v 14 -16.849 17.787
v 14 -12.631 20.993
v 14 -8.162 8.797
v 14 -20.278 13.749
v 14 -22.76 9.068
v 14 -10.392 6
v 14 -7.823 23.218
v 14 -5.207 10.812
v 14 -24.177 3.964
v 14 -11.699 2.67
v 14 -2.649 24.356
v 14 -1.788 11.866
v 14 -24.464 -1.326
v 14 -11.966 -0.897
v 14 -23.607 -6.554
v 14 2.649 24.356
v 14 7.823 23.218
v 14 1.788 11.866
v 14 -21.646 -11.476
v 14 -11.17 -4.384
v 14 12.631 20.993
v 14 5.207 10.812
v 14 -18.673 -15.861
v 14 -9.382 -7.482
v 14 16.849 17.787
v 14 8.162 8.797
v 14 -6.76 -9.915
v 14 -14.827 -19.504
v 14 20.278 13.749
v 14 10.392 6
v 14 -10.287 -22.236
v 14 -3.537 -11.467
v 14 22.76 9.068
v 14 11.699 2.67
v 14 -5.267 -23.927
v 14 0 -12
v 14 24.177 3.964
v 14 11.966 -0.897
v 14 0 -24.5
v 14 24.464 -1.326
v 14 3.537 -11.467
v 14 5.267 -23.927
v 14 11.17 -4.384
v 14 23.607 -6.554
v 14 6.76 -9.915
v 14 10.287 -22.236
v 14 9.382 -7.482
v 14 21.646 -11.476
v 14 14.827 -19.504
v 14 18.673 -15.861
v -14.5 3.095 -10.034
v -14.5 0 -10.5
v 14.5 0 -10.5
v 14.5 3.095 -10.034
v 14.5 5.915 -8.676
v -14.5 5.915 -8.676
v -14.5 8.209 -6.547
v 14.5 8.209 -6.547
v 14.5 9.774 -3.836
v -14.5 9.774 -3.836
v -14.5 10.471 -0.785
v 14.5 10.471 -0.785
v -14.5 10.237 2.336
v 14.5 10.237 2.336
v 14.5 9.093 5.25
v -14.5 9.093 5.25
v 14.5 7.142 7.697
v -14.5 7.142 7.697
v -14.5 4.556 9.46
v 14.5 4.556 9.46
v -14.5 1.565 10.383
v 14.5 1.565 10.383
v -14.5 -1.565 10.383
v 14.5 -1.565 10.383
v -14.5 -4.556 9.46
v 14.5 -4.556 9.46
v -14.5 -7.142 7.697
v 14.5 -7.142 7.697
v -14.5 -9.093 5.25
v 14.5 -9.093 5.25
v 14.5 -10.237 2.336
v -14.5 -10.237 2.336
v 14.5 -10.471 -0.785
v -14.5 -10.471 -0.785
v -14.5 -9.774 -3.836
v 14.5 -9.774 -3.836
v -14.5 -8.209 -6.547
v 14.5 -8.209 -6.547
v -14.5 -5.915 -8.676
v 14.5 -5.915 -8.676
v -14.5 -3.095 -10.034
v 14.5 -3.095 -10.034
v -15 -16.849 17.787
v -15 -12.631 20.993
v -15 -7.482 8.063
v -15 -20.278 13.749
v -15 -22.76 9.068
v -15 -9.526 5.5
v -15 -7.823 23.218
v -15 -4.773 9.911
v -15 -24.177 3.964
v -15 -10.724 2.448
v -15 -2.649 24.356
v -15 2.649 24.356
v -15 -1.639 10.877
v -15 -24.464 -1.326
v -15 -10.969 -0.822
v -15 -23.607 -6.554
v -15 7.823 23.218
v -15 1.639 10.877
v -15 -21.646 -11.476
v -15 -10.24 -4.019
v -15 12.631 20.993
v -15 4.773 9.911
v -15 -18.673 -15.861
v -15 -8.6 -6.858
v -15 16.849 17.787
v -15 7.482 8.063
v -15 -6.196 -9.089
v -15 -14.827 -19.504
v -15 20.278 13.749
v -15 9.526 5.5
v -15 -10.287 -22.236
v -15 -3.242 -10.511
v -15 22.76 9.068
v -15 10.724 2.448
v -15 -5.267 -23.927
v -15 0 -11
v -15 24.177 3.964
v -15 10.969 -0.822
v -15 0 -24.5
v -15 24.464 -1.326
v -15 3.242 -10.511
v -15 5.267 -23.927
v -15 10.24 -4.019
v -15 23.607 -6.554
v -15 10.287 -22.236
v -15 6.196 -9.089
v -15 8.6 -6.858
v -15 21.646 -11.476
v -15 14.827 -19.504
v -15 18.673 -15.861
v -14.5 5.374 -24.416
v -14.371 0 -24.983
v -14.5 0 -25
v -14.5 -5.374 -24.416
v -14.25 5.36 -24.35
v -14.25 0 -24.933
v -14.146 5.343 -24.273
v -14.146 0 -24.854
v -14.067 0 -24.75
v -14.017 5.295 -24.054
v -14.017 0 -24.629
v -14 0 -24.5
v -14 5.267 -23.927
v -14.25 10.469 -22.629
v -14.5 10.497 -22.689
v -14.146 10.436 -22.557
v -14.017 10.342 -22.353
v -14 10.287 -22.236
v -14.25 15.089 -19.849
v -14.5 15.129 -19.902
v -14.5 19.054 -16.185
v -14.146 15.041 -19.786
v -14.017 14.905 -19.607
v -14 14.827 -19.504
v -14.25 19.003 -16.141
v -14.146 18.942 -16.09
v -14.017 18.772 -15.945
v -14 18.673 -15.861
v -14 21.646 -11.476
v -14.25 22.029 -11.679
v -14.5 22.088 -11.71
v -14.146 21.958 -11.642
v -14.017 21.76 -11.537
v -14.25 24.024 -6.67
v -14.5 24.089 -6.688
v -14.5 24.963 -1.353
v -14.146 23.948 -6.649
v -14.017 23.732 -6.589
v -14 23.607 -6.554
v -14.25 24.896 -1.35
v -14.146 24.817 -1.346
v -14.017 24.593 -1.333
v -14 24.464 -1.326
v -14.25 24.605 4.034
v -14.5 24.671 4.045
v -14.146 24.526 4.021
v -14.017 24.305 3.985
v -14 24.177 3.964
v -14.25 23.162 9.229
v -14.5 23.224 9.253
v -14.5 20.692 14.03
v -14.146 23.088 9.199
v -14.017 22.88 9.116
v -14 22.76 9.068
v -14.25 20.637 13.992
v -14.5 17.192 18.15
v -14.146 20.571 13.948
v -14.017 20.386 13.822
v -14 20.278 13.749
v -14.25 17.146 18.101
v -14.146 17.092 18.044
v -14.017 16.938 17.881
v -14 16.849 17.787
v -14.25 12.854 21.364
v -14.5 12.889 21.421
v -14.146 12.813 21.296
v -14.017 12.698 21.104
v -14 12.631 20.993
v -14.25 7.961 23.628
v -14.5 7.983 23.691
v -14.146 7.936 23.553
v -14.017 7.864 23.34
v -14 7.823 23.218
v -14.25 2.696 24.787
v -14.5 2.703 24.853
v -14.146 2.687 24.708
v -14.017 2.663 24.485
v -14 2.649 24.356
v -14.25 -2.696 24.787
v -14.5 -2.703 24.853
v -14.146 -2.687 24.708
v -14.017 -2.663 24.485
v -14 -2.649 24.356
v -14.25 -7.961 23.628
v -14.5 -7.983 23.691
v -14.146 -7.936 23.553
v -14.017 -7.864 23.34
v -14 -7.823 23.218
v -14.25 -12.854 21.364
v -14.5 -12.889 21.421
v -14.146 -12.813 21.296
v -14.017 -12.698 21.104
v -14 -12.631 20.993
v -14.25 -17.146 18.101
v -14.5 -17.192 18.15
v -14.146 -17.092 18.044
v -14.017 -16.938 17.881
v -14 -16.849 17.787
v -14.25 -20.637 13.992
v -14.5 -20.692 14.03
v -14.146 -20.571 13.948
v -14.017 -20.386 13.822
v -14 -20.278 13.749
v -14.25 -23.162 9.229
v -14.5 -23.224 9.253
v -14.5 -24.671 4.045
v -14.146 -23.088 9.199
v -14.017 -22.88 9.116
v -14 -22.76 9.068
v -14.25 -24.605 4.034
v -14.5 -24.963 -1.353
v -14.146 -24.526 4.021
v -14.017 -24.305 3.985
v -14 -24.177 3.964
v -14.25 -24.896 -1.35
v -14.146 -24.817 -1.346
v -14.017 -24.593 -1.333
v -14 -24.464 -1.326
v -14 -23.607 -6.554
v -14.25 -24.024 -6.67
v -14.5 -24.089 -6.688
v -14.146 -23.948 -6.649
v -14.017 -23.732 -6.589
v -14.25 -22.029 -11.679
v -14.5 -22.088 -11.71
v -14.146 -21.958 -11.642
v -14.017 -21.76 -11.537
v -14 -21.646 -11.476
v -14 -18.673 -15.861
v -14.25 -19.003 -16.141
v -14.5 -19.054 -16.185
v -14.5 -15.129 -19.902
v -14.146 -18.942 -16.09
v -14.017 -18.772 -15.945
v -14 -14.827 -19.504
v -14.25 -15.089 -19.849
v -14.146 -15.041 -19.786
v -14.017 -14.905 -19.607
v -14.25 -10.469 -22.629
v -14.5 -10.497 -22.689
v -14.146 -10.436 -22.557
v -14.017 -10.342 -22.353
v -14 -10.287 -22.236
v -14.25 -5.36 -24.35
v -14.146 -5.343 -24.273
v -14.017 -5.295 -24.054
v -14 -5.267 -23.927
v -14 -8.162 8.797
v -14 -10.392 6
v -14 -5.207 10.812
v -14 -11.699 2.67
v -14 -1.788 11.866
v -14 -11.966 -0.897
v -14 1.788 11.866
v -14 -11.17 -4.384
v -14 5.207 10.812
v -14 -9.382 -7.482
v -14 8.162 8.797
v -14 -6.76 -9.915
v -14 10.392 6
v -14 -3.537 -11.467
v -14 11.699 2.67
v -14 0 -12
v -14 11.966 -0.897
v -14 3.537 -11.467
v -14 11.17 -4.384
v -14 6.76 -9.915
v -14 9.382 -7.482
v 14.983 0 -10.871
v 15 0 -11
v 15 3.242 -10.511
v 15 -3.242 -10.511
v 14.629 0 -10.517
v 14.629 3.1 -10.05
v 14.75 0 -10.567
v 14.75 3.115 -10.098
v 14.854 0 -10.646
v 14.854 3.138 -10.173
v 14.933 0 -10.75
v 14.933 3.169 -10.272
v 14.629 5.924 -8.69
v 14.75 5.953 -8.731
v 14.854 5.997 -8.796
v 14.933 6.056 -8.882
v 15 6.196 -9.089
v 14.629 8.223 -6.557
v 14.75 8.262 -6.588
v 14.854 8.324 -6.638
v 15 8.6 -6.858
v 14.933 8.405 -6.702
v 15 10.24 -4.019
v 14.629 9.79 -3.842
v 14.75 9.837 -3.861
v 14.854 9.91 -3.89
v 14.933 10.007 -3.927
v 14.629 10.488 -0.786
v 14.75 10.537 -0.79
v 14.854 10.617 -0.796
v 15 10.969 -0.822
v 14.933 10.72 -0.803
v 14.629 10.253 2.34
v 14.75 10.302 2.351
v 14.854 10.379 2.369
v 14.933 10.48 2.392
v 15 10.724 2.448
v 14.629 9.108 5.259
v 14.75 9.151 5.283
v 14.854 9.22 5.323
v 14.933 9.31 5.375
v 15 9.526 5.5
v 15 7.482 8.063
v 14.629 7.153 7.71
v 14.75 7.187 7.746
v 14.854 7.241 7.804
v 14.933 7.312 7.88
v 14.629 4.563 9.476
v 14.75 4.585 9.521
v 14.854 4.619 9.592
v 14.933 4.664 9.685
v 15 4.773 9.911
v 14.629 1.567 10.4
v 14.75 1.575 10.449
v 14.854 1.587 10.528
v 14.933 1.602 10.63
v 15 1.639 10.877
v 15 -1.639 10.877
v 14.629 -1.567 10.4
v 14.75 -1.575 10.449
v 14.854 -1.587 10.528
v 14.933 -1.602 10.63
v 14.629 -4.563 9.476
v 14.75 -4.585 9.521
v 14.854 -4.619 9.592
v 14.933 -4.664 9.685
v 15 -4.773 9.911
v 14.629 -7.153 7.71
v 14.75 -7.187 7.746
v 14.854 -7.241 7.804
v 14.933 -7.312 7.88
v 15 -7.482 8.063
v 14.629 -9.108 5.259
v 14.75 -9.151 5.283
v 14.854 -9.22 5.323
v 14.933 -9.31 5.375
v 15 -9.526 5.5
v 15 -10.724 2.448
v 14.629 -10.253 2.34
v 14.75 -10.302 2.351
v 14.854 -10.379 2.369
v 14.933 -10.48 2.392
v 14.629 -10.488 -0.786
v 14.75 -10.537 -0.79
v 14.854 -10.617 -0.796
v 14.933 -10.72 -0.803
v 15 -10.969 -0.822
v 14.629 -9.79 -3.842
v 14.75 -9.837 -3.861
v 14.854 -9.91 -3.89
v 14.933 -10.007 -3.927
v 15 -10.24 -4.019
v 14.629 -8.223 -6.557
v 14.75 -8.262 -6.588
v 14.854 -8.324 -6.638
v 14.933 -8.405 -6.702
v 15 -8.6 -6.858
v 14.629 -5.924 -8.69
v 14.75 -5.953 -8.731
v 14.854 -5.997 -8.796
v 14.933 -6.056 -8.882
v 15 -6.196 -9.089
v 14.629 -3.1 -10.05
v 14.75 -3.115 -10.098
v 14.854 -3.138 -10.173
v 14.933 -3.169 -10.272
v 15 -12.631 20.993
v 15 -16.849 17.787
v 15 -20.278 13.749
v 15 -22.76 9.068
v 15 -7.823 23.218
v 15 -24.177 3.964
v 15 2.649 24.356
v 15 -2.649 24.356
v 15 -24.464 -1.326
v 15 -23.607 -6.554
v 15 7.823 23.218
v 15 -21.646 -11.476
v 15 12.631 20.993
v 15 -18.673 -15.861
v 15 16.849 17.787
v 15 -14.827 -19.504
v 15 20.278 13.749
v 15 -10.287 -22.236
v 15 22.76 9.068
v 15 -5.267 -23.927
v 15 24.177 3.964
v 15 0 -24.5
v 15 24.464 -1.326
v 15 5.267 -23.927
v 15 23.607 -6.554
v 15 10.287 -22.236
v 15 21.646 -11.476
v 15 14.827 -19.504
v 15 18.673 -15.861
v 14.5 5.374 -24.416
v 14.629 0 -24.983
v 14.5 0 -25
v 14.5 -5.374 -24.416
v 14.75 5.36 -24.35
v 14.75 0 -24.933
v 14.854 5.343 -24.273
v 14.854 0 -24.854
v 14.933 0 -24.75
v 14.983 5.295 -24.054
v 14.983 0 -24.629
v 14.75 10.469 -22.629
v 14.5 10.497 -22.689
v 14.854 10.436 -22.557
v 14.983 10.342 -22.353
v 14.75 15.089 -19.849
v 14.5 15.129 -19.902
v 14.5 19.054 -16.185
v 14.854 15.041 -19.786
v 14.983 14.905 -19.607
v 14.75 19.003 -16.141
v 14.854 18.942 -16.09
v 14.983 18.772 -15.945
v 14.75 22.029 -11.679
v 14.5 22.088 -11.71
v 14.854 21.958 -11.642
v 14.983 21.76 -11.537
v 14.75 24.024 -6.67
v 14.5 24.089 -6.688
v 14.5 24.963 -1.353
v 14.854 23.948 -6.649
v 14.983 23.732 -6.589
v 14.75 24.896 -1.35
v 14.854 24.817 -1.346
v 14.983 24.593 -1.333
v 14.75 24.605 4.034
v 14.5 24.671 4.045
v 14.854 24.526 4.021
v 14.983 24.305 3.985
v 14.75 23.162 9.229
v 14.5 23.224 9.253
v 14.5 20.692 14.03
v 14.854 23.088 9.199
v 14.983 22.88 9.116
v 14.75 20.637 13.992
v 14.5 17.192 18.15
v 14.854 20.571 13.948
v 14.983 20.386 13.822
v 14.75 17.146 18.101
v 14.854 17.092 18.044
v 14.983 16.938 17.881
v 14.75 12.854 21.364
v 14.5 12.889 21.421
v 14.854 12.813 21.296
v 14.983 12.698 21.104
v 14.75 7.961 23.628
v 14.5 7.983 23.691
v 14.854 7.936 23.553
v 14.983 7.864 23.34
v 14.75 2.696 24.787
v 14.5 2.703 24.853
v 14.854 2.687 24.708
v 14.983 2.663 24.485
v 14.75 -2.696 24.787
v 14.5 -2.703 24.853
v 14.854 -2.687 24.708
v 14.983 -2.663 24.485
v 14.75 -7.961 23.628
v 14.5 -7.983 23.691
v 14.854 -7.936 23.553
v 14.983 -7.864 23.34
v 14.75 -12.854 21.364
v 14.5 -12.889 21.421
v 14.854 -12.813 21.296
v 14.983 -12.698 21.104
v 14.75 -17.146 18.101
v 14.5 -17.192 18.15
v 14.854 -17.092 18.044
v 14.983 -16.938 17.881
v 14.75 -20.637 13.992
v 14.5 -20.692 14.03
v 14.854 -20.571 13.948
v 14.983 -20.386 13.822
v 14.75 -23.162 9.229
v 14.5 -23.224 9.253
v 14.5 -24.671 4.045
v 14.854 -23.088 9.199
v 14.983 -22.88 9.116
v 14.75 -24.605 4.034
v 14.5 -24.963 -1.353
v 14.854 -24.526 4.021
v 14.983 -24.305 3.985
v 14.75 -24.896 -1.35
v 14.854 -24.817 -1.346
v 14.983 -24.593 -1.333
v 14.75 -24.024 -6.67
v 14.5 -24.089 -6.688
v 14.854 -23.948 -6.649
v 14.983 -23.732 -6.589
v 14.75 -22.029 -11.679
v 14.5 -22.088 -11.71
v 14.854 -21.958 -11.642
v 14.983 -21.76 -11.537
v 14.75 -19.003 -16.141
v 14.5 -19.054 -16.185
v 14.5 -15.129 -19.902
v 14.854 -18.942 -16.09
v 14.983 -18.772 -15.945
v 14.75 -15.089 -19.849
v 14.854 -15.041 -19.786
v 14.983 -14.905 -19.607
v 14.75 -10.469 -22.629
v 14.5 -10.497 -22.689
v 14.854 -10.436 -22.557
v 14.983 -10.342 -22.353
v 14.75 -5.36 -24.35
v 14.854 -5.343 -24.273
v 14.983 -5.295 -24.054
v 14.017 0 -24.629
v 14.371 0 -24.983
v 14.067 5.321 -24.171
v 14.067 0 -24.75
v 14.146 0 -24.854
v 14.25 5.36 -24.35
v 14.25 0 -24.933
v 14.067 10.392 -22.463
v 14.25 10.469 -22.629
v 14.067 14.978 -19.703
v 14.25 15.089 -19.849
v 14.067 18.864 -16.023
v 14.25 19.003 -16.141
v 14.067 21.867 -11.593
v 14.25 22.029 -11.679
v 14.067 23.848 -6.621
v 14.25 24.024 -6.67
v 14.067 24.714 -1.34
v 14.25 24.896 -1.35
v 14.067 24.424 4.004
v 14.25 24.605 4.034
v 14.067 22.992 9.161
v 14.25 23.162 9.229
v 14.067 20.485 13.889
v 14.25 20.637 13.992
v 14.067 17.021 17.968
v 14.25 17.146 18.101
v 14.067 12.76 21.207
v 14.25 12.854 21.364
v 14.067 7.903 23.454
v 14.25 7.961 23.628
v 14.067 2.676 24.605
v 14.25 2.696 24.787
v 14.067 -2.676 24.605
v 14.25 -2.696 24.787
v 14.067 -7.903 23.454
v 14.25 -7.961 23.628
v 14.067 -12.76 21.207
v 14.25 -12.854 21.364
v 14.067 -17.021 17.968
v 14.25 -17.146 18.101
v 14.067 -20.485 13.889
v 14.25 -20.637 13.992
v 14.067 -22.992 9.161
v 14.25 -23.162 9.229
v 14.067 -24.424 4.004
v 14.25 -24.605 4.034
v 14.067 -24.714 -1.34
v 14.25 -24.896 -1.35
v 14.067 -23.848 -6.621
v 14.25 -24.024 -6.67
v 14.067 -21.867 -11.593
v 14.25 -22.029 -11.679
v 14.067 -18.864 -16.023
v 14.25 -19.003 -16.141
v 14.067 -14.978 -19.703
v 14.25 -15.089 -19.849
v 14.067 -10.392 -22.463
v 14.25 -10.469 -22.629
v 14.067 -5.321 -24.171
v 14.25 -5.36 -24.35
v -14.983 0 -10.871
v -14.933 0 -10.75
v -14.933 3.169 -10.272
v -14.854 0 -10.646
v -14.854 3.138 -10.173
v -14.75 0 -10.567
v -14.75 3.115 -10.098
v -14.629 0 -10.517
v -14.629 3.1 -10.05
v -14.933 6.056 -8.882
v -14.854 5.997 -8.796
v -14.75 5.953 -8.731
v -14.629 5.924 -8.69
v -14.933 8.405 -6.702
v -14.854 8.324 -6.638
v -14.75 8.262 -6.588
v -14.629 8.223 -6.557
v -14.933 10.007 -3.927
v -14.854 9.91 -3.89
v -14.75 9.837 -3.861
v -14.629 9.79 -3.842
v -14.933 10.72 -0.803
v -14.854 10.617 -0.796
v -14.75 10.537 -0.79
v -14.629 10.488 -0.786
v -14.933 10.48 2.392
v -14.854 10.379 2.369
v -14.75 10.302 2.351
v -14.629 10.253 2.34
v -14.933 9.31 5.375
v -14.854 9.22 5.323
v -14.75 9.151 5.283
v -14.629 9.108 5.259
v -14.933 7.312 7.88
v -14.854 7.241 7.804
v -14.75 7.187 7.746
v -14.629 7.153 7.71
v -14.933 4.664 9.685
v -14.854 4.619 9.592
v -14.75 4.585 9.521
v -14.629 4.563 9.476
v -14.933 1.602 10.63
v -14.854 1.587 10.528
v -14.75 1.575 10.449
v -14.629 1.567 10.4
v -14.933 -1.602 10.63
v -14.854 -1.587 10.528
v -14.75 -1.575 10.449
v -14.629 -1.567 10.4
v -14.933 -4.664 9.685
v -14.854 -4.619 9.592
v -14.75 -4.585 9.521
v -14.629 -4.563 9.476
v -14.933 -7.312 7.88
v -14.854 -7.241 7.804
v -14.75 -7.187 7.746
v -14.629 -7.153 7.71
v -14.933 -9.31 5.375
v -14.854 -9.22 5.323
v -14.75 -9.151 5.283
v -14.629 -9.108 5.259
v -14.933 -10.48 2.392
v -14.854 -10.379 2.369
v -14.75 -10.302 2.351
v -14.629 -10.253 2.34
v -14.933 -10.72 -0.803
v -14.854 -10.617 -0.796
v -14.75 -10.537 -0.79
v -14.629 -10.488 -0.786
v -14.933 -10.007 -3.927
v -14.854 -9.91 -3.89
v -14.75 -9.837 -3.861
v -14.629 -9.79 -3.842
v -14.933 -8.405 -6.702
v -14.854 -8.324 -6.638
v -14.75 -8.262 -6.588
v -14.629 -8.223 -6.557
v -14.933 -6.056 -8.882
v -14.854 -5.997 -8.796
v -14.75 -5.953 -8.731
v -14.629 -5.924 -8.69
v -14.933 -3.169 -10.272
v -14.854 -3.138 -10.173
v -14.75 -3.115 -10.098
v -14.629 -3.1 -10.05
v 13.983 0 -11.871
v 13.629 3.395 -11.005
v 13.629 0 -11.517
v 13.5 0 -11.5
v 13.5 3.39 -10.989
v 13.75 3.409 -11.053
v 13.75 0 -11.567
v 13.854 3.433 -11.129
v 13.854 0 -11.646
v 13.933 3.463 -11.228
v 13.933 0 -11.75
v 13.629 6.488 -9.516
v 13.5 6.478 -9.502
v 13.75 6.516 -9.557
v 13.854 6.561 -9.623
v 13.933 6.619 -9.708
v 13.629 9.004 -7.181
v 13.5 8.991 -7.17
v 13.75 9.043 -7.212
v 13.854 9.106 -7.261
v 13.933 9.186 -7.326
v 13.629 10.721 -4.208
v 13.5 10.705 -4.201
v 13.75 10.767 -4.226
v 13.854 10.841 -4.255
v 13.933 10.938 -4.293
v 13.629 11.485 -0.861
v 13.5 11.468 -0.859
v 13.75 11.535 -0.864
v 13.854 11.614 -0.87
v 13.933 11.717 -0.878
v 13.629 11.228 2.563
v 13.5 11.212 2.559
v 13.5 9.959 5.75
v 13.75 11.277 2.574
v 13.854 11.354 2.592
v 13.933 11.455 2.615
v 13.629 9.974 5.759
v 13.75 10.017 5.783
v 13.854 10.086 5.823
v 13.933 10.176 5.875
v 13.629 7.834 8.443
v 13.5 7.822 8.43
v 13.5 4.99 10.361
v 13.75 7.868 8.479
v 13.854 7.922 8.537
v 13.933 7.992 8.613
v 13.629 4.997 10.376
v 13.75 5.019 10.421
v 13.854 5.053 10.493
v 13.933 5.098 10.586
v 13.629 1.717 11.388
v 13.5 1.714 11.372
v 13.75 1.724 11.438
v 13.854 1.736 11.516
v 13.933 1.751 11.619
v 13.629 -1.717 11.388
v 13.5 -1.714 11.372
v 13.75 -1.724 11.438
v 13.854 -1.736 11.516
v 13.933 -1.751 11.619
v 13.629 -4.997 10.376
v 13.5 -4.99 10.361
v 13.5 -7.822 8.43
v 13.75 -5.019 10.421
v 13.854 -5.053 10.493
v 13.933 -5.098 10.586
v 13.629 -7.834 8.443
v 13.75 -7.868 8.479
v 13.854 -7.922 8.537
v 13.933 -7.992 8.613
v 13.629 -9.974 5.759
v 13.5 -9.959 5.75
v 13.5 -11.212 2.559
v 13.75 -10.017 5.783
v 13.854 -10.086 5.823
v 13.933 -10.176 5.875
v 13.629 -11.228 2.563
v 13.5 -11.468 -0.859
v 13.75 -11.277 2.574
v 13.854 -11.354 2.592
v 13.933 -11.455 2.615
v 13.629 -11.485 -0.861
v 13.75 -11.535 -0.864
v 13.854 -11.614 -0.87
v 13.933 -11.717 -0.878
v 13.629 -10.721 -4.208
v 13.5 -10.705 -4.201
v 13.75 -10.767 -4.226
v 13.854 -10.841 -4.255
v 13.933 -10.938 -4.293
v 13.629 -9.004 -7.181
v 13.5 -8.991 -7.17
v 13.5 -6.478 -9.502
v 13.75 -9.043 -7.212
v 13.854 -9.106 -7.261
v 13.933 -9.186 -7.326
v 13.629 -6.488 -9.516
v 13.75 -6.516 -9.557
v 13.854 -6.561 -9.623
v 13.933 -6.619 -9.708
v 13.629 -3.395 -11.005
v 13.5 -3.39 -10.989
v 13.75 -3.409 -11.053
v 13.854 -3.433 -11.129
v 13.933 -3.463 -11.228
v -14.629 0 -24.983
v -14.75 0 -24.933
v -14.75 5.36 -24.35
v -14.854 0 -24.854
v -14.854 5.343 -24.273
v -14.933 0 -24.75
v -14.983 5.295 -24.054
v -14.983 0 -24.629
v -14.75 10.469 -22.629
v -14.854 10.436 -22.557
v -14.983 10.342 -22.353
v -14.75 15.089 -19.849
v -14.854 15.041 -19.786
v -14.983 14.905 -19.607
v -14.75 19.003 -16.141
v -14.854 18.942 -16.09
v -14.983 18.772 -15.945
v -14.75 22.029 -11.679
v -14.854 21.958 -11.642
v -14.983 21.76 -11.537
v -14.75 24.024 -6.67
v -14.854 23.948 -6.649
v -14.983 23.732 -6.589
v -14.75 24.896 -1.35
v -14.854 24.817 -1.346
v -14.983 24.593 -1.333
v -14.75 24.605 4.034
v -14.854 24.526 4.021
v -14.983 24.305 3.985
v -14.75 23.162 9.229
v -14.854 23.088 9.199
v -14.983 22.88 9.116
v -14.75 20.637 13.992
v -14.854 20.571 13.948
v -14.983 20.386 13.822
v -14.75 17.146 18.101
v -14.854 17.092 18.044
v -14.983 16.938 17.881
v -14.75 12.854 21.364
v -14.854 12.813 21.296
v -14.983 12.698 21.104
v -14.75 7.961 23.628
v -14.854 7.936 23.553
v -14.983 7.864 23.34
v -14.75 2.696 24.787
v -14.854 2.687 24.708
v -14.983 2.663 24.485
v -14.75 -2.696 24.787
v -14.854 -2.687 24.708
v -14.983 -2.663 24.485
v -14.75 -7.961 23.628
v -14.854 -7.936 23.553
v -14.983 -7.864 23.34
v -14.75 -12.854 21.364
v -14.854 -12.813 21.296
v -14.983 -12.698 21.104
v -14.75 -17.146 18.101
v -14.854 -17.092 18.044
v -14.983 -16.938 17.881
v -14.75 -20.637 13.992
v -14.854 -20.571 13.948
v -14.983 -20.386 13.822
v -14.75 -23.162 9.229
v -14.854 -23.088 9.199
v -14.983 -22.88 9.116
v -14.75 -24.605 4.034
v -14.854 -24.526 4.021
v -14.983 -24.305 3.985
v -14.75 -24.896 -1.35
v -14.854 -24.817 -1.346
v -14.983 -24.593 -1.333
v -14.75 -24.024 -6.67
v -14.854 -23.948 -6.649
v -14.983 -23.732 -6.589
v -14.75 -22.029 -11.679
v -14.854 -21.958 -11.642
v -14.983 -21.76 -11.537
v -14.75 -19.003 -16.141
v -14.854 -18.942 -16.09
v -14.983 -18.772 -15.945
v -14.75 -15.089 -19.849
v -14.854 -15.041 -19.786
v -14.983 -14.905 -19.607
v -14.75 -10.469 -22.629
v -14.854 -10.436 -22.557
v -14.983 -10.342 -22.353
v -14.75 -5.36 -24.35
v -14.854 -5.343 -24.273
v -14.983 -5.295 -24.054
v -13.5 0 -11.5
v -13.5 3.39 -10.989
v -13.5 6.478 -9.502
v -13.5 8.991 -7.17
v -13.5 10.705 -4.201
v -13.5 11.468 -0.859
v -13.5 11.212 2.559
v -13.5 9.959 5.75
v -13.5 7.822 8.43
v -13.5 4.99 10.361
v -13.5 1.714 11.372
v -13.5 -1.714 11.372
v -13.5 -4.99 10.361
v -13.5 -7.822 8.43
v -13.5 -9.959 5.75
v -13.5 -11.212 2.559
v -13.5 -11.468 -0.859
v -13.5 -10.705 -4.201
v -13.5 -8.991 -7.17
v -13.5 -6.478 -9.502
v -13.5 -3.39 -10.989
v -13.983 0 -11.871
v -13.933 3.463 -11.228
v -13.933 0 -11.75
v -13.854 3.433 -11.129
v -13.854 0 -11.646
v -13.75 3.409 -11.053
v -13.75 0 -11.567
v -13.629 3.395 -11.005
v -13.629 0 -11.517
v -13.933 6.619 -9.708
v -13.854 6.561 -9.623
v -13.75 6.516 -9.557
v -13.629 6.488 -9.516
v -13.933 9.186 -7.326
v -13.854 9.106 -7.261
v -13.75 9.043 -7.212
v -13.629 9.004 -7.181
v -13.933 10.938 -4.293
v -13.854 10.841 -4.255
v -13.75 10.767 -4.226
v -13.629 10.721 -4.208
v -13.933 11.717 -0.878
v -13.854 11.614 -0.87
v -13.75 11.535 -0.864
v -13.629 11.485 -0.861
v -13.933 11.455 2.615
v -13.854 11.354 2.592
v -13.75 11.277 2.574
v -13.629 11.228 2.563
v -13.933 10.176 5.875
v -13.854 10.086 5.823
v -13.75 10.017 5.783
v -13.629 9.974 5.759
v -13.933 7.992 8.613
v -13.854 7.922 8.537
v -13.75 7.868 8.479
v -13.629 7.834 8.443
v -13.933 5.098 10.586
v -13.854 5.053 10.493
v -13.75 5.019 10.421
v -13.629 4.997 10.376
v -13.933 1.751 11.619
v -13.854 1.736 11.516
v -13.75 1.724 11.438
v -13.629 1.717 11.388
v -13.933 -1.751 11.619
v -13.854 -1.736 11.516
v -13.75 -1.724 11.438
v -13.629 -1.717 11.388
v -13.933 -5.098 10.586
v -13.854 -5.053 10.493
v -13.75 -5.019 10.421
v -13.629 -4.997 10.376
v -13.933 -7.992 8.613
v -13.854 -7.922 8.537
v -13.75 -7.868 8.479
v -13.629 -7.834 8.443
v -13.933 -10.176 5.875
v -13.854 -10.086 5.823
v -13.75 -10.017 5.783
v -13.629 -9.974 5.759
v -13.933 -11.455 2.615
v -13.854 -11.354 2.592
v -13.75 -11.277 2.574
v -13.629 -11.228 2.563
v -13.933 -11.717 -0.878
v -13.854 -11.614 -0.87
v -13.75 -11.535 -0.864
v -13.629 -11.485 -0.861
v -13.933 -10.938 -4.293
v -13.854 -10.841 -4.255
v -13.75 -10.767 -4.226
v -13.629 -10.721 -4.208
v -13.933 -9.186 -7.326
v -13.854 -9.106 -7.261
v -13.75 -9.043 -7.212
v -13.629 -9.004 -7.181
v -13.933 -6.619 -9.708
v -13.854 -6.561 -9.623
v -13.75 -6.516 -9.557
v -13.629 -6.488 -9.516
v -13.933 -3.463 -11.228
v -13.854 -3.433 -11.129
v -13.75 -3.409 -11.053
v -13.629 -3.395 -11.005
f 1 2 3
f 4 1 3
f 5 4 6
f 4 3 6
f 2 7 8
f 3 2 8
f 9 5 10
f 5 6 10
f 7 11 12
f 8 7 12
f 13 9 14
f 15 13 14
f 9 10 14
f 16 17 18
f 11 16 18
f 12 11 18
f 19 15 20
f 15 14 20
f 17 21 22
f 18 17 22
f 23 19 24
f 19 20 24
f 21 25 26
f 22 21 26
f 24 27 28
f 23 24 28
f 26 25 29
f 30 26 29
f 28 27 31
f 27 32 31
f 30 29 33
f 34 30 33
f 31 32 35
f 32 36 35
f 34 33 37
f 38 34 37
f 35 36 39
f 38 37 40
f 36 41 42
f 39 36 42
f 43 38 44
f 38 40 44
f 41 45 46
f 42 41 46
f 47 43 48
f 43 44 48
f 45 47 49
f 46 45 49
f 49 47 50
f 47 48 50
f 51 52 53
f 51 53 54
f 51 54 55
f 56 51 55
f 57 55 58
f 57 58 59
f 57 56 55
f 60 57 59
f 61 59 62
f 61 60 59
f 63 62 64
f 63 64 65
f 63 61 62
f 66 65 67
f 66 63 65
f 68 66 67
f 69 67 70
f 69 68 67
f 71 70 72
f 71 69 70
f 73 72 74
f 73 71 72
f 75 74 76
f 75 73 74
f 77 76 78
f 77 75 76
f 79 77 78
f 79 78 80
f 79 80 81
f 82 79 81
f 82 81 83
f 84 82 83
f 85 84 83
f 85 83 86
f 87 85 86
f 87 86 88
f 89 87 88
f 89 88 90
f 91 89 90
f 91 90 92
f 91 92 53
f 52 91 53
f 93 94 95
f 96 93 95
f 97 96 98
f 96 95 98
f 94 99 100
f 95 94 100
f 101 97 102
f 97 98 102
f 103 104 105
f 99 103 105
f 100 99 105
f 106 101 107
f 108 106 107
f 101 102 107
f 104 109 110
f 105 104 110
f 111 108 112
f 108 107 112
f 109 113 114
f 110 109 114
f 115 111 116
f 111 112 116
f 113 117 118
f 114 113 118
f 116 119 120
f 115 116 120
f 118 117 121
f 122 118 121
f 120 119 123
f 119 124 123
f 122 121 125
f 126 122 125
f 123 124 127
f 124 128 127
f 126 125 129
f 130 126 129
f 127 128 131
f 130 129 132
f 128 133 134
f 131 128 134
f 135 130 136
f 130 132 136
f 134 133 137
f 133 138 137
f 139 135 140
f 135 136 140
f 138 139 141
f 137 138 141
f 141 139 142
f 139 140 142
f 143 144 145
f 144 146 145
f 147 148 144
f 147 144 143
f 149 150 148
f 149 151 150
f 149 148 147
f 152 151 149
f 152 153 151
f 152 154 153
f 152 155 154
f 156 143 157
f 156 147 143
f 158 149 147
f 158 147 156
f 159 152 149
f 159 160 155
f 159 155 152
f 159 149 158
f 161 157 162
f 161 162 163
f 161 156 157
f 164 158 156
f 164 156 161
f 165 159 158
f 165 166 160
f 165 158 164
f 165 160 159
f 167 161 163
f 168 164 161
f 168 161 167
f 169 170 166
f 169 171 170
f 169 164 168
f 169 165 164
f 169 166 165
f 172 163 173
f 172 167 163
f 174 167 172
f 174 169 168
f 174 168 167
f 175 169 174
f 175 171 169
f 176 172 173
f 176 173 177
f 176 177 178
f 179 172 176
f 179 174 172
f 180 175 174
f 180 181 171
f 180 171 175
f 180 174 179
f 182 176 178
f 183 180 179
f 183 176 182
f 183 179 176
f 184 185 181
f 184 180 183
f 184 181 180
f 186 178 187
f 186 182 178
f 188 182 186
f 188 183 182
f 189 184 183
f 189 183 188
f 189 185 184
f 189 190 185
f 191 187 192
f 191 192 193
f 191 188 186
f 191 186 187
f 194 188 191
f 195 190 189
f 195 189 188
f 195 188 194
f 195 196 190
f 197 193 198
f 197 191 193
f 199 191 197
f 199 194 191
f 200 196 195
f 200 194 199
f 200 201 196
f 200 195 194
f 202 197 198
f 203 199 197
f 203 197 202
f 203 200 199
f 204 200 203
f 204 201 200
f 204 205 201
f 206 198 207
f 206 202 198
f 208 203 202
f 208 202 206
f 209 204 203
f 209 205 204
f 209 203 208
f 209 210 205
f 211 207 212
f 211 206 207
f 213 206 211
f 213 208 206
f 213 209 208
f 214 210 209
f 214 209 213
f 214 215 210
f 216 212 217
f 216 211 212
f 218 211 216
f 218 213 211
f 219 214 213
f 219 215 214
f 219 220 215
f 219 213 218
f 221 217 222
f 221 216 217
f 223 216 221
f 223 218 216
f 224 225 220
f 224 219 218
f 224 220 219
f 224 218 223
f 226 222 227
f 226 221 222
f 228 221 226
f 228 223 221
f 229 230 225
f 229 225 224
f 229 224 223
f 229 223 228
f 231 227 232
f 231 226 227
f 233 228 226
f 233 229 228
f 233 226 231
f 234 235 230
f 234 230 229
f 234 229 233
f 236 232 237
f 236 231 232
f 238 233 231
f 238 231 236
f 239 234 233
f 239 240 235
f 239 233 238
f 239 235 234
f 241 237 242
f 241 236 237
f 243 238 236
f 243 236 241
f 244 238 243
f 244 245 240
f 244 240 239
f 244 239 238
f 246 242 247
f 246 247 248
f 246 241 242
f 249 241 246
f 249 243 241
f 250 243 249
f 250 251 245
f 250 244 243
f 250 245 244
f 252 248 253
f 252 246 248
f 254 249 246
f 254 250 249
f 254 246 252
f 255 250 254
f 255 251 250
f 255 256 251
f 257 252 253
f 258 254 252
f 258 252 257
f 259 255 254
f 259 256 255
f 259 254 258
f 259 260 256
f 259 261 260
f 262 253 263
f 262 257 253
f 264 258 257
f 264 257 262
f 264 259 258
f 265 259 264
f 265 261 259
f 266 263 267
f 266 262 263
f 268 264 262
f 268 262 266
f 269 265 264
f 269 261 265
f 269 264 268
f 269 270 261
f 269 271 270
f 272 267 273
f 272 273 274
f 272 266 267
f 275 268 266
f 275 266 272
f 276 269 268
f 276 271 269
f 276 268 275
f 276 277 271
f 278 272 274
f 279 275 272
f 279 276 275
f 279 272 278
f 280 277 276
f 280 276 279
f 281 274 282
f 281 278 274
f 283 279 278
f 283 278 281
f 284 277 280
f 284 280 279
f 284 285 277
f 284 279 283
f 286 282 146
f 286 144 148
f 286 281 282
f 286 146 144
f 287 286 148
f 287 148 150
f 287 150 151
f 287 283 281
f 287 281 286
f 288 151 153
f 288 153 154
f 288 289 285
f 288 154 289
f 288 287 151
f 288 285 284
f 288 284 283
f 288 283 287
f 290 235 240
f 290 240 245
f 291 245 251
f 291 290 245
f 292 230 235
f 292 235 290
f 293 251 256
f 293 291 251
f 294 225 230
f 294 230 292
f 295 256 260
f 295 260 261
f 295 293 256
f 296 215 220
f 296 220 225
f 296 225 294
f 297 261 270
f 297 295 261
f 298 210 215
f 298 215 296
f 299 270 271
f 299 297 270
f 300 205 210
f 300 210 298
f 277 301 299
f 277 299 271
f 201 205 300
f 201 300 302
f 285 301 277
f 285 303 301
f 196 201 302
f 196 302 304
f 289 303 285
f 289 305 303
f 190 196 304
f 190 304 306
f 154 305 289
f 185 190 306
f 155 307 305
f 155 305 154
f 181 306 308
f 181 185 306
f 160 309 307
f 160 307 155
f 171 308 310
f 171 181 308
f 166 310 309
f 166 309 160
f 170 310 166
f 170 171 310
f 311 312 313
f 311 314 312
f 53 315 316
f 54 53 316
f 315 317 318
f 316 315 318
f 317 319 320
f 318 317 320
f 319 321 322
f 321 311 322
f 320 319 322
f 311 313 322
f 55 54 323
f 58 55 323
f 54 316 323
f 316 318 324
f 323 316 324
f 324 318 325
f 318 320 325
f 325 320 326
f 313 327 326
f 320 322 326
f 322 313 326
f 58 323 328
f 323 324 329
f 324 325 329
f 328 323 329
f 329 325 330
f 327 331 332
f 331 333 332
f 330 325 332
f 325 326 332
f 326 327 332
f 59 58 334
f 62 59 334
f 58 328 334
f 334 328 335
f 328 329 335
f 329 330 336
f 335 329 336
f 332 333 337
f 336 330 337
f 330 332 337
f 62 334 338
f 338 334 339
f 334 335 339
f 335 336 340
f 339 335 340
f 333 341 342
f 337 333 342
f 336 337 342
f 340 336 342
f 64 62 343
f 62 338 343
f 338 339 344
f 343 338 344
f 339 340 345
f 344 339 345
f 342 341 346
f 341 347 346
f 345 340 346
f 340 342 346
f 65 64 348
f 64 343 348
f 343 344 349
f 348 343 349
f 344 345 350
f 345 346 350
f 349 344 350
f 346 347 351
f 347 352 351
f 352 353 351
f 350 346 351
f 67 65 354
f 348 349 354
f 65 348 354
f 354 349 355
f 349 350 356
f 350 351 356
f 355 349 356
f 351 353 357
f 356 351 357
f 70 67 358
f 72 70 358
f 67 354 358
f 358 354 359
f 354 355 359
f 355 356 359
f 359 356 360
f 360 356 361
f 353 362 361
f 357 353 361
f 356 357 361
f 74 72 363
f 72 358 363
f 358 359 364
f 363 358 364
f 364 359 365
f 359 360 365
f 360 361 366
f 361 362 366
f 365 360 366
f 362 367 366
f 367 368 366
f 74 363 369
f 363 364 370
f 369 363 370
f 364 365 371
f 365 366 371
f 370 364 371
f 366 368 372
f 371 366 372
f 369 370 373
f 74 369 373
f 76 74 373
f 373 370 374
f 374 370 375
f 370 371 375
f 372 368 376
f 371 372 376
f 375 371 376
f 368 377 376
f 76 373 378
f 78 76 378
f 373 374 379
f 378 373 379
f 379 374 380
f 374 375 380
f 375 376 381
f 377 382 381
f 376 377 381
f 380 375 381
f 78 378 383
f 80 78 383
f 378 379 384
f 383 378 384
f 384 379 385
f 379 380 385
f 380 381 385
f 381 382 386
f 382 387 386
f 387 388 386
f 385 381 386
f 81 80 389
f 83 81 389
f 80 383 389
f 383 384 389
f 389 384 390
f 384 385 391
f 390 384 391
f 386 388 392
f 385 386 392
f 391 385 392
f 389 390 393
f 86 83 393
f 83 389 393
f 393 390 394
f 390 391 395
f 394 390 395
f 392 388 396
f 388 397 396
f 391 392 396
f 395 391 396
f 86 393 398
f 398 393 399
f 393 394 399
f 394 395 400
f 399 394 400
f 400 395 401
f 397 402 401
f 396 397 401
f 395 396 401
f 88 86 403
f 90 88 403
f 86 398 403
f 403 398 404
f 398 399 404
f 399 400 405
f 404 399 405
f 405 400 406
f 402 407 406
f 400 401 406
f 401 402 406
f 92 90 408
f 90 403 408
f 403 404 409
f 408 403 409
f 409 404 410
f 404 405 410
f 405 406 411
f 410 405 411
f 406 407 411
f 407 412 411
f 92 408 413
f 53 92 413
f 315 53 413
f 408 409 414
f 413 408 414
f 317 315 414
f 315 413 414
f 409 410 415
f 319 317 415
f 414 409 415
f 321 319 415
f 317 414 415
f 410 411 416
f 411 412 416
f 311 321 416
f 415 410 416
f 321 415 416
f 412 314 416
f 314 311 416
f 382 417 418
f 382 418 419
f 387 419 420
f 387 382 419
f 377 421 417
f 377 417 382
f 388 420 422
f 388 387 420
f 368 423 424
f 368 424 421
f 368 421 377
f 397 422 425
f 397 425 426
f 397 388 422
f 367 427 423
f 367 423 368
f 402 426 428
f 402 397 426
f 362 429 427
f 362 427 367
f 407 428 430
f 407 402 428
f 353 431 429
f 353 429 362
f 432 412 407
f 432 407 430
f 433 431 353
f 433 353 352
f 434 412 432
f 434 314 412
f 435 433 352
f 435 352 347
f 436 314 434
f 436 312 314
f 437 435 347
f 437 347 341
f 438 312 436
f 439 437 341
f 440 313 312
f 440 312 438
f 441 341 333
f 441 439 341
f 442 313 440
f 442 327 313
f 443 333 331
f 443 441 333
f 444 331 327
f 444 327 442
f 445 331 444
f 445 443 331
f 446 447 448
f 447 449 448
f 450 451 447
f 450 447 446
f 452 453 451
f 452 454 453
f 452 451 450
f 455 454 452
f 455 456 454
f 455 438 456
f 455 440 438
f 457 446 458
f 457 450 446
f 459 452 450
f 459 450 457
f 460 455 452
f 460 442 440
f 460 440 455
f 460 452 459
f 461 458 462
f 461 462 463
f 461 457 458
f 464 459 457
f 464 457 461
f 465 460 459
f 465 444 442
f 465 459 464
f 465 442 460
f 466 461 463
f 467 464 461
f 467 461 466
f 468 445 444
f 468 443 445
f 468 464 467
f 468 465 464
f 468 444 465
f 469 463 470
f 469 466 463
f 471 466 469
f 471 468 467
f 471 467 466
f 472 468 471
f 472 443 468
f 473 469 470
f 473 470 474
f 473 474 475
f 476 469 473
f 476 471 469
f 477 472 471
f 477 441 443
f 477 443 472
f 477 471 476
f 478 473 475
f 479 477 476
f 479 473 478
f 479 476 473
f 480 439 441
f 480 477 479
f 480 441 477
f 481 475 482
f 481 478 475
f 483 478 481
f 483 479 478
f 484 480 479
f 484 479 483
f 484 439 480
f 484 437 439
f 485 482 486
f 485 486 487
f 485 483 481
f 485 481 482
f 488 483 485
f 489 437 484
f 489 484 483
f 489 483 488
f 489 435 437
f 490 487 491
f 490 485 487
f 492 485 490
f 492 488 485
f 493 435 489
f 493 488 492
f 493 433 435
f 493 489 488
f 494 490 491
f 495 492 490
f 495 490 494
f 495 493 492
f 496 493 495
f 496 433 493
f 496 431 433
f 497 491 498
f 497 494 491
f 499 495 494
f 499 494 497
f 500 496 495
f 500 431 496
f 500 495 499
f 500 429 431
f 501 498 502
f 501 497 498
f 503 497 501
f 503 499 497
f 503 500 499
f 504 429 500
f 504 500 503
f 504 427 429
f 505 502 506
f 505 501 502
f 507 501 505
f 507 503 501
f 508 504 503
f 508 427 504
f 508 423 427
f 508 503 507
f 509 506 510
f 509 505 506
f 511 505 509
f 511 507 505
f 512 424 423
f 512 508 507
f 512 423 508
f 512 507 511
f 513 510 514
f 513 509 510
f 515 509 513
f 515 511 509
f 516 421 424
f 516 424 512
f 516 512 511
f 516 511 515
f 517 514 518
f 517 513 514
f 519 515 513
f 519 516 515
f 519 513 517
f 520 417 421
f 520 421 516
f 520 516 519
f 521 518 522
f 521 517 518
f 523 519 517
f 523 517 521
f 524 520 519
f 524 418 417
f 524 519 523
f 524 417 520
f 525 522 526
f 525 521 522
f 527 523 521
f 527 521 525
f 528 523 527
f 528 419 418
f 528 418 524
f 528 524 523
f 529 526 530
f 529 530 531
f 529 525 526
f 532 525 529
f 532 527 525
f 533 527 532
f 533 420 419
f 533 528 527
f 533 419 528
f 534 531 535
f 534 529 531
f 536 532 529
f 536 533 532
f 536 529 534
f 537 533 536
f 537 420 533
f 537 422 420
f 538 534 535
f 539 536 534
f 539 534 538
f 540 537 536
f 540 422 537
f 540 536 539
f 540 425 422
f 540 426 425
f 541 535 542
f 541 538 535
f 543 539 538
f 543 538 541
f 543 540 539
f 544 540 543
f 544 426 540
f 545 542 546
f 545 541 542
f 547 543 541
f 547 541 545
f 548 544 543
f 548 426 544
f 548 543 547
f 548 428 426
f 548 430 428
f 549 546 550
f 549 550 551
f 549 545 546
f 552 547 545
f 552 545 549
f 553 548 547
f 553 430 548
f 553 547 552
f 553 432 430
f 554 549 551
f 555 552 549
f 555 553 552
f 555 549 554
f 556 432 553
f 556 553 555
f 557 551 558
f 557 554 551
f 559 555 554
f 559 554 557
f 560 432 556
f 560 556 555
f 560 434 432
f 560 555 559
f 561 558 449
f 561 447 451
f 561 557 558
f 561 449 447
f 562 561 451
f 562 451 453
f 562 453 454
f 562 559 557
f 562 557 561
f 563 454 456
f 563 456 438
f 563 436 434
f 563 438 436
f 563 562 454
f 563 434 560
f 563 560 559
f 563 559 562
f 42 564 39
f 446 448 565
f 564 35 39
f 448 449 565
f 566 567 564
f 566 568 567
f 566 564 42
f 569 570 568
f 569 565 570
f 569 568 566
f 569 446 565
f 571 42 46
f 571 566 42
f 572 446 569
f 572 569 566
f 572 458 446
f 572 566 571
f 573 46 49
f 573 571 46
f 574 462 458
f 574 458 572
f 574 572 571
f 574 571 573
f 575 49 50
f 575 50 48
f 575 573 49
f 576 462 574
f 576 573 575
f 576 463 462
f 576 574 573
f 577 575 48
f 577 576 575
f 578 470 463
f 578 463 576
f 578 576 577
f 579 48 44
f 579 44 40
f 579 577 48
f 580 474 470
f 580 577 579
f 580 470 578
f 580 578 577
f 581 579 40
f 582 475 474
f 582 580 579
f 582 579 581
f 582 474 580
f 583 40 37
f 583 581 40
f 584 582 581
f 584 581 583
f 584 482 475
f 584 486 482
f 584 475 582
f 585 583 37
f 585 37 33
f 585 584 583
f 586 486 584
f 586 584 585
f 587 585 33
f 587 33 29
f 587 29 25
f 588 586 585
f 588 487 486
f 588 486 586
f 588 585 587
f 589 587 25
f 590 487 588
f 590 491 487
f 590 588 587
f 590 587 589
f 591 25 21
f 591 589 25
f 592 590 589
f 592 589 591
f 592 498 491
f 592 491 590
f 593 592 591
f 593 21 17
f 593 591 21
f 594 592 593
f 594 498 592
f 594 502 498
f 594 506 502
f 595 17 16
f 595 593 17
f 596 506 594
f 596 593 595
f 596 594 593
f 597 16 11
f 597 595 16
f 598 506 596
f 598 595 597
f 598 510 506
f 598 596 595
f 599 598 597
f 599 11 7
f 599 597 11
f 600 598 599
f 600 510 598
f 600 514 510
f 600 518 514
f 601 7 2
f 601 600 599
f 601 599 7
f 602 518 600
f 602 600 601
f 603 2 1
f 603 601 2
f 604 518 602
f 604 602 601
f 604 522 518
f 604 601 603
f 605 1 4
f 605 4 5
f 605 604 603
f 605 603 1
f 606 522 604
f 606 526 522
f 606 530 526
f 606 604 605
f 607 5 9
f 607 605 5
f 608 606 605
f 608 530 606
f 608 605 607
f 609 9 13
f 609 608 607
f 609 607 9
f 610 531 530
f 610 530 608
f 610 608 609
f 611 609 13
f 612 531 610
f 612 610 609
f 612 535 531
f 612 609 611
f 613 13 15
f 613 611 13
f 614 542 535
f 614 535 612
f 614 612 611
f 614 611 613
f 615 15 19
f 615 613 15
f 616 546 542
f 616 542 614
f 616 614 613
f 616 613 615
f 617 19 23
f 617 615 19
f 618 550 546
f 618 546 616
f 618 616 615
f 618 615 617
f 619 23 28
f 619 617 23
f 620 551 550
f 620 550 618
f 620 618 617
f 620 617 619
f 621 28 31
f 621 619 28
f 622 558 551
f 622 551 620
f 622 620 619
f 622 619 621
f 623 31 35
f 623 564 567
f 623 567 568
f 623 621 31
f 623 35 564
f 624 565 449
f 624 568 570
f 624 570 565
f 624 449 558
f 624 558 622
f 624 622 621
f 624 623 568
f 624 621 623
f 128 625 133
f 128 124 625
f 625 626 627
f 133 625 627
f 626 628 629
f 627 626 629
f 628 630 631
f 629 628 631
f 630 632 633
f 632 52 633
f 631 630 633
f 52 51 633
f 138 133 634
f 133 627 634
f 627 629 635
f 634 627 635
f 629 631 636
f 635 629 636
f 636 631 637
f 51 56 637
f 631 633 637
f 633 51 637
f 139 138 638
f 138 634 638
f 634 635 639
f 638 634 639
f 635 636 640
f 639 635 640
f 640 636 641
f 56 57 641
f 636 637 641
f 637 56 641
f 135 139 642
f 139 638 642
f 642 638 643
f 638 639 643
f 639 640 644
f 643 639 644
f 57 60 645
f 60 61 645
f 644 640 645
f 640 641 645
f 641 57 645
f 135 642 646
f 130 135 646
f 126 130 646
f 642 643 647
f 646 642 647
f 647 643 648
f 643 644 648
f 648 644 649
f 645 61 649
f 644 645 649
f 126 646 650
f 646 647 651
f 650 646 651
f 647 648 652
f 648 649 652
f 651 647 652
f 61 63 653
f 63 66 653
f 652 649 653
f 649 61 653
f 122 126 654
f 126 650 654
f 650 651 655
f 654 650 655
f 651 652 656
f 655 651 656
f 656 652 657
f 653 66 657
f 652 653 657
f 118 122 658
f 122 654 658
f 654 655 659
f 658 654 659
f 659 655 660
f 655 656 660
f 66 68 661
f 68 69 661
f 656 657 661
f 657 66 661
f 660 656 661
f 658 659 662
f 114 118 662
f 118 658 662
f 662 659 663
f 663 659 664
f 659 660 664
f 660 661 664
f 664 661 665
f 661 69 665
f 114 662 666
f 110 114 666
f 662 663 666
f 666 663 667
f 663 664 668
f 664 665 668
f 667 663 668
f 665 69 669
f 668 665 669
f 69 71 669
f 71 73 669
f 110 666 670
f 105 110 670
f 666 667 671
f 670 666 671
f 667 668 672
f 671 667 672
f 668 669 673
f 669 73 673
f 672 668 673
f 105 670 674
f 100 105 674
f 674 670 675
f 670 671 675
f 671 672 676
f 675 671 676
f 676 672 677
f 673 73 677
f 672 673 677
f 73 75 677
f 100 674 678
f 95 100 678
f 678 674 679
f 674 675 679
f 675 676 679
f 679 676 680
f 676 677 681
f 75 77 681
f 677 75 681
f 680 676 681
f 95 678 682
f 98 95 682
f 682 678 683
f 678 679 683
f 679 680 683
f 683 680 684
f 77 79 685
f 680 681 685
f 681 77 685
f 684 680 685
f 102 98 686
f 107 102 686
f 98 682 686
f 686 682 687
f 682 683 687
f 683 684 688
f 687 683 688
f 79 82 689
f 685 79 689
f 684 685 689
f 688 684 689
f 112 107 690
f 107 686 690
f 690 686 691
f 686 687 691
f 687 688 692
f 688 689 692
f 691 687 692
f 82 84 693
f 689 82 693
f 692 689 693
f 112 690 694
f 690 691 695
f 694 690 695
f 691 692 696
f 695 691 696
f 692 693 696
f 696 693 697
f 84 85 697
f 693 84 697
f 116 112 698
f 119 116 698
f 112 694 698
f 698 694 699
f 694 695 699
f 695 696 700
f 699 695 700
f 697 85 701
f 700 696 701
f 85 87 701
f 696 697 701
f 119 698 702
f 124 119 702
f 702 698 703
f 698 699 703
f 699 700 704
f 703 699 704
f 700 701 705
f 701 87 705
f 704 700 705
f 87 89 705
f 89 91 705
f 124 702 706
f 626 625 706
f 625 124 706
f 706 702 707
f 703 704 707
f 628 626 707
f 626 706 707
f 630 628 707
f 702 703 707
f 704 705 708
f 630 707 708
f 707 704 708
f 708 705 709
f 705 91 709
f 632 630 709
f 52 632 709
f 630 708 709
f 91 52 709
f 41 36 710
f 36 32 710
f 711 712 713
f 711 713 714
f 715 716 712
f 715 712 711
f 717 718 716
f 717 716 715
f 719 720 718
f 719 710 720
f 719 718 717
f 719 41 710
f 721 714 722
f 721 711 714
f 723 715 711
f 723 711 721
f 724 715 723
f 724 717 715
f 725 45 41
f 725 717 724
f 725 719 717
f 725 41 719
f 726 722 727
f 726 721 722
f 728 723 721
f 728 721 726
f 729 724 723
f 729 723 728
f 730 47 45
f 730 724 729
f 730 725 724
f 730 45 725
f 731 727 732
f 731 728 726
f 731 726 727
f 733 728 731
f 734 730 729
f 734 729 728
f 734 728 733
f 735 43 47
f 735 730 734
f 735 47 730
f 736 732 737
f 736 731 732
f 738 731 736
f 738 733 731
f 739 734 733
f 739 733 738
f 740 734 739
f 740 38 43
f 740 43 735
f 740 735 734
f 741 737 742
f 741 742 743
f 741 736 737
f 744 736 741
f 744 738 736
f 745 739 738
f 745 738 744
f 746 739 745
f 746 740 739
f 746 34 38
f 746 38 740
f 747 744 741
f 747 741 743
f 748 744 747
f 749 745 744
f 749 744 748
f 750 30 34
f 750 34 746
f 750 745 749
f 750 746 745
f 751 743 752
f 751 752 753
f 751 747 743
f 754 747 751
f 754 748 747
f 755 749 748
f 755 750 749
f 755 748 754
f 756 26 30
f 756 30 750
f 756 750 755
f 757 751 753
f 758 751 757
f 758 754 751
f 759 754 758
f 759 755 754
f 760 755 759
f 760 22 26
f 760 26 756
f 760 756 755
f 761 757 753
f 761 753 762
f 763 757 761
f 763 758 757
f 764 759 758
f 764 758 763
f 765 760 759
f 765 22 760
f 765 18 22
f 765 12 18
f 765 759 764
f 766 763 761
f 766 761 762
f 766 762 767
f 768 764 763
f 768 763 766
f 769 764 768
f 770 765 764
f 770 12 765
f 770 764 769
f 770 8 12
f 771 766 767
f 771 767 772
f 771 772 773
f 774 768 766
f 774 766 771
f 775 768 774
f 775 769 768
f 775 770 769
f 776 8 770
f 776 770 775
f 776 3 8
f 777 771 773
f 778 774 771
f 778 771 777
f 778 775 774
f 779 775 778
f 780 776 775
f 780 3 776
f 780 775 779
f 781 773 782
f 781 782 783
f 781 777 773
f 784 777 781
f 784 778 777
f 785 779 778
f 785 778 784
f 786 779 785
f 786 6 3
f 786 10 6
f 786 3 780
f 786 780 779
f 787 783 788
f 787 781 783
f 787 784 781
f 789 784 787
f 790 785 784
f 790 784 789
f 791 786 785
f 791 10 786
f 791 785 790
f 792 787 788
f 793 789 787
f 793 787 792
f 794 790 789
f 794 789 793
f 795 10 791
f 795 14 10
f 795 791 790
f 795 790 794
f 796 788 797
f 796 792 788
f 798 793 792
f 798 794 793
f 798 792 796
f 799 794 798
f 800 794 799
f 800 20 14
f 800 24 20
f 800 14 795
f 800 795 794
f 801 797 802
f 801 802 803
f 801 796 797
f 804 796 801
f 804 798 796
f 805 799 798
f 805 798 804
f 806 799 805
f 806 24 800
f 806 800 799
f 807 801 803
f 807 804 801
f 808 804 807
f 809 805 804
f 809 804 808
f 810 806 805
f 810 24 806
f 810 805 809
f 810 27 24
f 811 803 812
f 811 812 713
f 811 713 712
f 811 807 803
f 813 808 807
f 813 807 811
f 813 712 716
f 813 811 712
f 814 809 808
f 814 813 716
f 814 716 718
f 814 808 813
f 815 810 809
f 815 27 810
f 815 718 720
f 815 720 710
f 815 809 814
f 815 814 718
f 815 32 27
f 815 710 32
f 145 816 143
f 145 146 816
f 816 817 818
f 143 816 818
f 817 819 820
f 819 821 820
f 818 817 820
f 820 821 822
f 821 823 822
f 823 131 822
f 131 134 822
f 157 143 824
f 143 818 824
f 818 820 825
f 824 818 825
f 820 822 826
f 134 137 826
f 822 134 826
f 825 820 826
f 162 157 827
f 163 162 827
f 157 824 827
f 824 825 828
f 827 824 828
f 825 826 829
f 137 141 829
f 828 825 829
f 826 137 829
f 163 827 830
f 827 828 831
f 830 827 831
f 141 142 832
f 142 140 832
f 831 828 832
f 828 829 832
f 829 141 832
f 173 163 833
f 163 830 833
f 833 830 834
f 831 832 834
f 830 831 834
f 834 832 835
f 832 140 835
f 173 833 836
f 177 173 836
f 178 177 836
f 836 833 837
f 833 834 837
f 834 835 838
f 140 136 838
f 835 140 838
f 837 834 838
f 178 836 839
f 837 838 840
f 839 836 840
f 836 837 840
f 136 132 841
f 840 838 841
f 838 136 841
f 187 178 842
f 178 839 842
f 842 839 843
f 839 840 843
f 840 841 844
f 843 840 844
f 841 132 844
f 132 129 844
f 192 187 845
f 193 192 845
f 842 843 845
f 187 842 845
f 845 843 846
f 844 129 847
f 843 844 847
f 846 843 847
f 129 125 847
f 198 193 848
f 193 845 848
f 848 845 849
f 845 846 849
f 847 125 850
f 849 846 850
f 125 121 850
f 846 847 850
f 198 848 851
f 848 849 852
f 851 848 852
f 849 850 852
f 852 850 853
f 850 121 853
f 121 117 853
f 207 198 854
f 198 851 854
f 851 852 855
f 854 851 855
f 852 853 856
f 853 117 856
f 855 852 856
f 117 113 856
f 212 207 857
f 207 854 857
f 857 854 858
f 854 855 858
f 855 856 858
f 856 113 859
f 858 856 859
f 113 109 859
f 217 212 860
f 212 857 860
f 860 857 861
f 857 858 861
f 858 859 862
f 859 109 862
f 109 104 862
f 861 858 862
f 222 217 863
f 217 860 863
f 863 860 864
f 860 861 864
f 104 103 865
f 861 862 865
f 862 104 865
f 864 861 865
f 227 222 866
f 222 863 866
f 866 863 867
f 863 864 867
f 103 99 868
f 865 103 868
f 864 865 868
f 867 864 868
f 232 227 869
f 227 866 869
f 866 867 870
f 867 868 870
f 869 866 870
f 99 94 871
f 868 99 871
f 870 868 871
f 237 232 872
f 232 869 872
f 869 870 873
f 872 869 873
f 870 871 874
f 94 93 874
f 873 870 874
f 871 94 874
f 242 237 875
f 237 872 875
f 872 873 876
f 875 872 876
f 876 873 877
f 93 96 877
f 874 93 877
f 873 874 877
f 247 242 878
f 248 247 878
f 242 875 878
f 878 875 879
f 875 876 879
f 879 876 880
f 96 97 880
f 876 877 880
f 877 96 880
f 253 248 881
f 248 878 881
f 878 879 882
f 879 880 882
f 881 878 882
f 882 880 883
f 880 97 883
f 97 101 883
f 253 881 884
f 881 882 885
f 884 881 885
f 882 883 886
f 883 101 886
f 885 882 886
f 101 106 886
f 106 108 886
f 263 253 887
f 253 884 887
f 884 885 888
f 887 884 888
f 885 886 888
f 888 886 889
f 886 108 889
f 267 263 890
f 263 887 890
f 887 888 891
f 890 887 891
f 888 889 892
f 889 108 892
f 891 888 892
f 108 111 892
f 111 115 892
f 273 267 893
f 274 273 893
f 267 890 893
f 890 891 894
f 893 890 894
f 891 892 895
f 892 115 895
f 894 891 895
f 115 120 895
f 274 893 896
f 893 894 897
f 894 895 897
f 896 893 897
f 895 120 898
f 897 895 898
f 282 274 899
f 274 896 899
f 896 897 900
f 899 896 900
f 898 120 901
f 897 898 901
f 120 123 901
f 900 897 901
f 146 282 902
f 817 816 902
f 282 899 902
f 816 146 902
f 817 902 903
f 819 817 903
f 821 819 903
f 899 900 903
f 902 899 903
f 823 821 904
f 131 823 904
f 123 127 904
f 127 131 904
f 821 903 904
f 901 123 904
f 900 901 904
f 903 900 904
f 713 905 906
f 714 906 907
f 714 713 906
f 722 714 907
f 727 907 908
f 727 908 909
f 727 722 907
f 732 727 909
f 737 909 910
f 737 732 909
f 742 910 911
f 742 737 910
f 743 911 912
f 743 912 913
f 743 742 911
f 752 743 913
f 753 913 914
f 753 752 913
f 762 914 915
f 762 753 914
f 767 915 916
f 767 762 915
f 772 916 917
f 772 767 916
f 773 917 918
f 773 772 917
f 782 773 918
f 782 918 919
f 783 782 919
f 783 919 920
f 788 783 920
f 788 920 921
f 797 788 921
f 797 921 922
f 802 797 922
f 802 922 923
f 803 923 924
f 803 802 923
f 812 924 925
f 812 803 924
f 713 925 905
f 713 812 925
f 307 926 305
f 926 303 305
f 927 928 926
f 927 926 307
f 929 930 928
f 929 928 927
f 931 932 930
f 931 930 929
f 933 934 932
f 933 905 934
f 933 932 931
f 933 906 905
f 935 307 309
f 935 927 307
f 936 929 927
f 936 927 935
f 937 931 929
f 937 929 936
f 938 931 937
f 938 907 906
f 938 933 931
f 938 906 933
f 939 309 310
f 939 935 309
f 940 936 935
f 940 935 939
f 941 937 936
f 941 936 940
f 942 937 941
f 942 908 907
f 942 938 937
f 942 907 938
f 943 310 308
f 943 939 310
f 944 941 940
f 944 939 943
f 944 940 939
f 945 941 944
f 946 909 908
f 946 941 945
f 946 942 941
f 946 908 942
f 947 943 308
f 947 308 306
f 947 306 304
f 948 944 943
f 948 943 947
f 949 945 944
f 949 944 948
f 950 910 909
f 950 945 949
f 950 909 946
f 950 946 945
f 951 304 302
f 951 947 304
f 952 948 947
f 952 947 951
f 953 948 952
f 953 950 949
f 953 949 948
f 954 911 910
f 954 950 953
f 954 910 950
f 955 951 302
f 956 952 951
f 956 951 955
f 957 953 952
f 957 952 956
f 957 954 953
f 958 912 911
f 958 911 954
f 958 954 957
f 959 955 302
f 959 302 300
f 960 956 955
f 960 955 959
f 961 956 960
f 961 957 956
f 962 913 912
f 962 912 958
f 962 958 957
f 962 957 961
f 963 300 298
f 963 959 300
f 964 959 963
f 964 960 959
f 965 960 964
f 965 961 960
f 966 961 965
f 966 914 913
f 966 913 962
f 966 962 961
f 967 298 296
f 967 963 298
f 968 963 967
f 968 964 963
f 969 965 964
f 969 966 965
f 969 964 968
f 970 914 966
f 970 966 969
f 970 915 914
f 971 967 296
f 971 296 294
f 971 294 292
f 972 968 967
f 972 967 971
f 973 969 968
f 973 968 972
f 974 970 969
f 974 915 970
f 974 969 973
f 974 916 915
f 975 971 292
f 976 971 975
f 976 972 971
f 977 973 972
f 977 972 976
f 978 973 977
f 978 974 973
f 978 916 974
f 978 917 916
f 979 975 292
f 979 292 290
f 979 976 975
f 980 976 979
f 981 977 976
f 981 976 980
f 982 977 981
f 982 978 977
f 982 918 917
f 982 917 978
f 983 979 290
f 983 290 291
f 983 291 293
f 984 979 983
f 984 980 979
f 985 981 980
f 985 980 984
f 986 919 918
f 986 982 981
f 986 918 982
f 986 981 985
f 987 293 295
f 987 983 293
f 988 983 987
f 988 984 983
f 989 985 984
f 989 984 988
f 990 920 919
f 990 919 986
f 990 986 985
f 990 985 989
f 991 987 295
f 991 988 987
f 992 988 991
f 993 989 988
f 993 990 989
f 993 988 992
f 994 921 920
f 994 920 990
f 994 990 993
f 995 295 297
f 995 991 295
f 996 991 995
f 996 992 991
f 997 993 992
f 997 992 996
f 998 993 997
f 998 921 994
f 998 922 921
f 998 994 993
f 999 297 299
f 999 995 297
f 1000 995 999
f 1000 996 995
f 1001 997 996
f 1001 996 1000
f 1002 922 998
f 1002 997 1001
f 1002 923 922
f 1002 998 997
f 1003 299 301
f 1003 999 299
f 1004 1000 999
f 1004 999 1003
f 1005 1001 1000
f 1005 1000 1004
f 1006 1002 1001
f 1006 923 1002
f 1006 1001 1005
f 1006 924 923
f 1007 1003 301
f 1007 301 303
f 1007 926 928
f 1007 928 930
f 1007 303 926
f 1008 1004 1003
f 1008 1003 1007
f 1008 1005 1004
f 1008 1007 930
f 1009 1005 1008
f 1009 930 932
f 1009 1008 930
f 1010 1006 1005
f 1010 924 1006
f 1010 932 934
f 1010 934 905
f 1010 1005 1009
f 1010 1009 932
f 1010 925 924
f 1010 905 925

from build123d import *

# Parameters (mm, degrees)
SKETCH1_R           = 11.5
SKETCH1_R_2         = 10.5
BOSS_EXTRUDE1_DEPTH = 15
BOSS_EXTRUDE2_START = 15
SKETCH1_3_R         = 25
SKETCH1_3_R_2       = 11.5
BOSS_EXTRUDE2_DEPTH = 1
BOSS_EXTRUDE3_START = -14
SKETCH1_4_R         = 25
SKETCH1_4_R_2       = 11.5
BOSS_EXTRUDE3_DEPTH = 1
FILLET1_R           = 0.5


with BuildPart() as part:
    # Sketch1 → Boss-Extrude1 (new, symmetric)
    with BuildSketch(Plane(origin=(0, 0, 0), x_dir=(0, 0, -1), z_dir=(1, 0, 0))):
        Circle(SKETCH1_R)
        Circle(SKETCH1_R_2, mode=Mode.SUBTRACT)
    extrude(amount=BOSS_EXTRUDE1_DEPTH, both=True)

    # Sketch1<3> → Boss-Extrude2 (add)
    with BuildSketch(Plane(origin=(0, 0, 0), x_dir=(0, 0, -1), z_dir=(1, 0, 0)).offset(BOSS_EXTRUDE2_START)):
        Circle(SKETCH1_3_R)
        Circle(SKETCH1_3_R_2, mode=Mode.SUBTRACT)
    extrude(amount=-BOSS_EXTRUDE2_DEPTH)

    # Sketch1<4> → Boss-Extrude3 (add)
    with BuildSketch(Plane(origin=(0, 0, 0), x_dir=(0, 0, -1), z_dir=(1, 0, 0)).offset(BOSS_EXTRUDE3_START)):
        Circle(SKETCH1_4_R)
        Circle(SKETCH1_4_R_2, mode=Mode.SUBTRACT)
    extrude(amount=-BOSS_EXTRUDE3_DEPTH)

    # Fillet1
    fillet1_edges = [part.edges().sort_by_distance(p)[0] for p in [
        (-14, 0, 11.5),
        (-15, 0, 25),
        (-14, 0, 25),
        (-15, 0, 10.5),
        (15, 0, 10.5),
        (14, 0, 11.5),
        (14, 0, 25),
        (15, 0, 25),
    ]]
    fillet(fillet1_edges, radius=FILLET1_R - 0.0001)  # a hair under: the kernel refuses the full size


solid = part.part
